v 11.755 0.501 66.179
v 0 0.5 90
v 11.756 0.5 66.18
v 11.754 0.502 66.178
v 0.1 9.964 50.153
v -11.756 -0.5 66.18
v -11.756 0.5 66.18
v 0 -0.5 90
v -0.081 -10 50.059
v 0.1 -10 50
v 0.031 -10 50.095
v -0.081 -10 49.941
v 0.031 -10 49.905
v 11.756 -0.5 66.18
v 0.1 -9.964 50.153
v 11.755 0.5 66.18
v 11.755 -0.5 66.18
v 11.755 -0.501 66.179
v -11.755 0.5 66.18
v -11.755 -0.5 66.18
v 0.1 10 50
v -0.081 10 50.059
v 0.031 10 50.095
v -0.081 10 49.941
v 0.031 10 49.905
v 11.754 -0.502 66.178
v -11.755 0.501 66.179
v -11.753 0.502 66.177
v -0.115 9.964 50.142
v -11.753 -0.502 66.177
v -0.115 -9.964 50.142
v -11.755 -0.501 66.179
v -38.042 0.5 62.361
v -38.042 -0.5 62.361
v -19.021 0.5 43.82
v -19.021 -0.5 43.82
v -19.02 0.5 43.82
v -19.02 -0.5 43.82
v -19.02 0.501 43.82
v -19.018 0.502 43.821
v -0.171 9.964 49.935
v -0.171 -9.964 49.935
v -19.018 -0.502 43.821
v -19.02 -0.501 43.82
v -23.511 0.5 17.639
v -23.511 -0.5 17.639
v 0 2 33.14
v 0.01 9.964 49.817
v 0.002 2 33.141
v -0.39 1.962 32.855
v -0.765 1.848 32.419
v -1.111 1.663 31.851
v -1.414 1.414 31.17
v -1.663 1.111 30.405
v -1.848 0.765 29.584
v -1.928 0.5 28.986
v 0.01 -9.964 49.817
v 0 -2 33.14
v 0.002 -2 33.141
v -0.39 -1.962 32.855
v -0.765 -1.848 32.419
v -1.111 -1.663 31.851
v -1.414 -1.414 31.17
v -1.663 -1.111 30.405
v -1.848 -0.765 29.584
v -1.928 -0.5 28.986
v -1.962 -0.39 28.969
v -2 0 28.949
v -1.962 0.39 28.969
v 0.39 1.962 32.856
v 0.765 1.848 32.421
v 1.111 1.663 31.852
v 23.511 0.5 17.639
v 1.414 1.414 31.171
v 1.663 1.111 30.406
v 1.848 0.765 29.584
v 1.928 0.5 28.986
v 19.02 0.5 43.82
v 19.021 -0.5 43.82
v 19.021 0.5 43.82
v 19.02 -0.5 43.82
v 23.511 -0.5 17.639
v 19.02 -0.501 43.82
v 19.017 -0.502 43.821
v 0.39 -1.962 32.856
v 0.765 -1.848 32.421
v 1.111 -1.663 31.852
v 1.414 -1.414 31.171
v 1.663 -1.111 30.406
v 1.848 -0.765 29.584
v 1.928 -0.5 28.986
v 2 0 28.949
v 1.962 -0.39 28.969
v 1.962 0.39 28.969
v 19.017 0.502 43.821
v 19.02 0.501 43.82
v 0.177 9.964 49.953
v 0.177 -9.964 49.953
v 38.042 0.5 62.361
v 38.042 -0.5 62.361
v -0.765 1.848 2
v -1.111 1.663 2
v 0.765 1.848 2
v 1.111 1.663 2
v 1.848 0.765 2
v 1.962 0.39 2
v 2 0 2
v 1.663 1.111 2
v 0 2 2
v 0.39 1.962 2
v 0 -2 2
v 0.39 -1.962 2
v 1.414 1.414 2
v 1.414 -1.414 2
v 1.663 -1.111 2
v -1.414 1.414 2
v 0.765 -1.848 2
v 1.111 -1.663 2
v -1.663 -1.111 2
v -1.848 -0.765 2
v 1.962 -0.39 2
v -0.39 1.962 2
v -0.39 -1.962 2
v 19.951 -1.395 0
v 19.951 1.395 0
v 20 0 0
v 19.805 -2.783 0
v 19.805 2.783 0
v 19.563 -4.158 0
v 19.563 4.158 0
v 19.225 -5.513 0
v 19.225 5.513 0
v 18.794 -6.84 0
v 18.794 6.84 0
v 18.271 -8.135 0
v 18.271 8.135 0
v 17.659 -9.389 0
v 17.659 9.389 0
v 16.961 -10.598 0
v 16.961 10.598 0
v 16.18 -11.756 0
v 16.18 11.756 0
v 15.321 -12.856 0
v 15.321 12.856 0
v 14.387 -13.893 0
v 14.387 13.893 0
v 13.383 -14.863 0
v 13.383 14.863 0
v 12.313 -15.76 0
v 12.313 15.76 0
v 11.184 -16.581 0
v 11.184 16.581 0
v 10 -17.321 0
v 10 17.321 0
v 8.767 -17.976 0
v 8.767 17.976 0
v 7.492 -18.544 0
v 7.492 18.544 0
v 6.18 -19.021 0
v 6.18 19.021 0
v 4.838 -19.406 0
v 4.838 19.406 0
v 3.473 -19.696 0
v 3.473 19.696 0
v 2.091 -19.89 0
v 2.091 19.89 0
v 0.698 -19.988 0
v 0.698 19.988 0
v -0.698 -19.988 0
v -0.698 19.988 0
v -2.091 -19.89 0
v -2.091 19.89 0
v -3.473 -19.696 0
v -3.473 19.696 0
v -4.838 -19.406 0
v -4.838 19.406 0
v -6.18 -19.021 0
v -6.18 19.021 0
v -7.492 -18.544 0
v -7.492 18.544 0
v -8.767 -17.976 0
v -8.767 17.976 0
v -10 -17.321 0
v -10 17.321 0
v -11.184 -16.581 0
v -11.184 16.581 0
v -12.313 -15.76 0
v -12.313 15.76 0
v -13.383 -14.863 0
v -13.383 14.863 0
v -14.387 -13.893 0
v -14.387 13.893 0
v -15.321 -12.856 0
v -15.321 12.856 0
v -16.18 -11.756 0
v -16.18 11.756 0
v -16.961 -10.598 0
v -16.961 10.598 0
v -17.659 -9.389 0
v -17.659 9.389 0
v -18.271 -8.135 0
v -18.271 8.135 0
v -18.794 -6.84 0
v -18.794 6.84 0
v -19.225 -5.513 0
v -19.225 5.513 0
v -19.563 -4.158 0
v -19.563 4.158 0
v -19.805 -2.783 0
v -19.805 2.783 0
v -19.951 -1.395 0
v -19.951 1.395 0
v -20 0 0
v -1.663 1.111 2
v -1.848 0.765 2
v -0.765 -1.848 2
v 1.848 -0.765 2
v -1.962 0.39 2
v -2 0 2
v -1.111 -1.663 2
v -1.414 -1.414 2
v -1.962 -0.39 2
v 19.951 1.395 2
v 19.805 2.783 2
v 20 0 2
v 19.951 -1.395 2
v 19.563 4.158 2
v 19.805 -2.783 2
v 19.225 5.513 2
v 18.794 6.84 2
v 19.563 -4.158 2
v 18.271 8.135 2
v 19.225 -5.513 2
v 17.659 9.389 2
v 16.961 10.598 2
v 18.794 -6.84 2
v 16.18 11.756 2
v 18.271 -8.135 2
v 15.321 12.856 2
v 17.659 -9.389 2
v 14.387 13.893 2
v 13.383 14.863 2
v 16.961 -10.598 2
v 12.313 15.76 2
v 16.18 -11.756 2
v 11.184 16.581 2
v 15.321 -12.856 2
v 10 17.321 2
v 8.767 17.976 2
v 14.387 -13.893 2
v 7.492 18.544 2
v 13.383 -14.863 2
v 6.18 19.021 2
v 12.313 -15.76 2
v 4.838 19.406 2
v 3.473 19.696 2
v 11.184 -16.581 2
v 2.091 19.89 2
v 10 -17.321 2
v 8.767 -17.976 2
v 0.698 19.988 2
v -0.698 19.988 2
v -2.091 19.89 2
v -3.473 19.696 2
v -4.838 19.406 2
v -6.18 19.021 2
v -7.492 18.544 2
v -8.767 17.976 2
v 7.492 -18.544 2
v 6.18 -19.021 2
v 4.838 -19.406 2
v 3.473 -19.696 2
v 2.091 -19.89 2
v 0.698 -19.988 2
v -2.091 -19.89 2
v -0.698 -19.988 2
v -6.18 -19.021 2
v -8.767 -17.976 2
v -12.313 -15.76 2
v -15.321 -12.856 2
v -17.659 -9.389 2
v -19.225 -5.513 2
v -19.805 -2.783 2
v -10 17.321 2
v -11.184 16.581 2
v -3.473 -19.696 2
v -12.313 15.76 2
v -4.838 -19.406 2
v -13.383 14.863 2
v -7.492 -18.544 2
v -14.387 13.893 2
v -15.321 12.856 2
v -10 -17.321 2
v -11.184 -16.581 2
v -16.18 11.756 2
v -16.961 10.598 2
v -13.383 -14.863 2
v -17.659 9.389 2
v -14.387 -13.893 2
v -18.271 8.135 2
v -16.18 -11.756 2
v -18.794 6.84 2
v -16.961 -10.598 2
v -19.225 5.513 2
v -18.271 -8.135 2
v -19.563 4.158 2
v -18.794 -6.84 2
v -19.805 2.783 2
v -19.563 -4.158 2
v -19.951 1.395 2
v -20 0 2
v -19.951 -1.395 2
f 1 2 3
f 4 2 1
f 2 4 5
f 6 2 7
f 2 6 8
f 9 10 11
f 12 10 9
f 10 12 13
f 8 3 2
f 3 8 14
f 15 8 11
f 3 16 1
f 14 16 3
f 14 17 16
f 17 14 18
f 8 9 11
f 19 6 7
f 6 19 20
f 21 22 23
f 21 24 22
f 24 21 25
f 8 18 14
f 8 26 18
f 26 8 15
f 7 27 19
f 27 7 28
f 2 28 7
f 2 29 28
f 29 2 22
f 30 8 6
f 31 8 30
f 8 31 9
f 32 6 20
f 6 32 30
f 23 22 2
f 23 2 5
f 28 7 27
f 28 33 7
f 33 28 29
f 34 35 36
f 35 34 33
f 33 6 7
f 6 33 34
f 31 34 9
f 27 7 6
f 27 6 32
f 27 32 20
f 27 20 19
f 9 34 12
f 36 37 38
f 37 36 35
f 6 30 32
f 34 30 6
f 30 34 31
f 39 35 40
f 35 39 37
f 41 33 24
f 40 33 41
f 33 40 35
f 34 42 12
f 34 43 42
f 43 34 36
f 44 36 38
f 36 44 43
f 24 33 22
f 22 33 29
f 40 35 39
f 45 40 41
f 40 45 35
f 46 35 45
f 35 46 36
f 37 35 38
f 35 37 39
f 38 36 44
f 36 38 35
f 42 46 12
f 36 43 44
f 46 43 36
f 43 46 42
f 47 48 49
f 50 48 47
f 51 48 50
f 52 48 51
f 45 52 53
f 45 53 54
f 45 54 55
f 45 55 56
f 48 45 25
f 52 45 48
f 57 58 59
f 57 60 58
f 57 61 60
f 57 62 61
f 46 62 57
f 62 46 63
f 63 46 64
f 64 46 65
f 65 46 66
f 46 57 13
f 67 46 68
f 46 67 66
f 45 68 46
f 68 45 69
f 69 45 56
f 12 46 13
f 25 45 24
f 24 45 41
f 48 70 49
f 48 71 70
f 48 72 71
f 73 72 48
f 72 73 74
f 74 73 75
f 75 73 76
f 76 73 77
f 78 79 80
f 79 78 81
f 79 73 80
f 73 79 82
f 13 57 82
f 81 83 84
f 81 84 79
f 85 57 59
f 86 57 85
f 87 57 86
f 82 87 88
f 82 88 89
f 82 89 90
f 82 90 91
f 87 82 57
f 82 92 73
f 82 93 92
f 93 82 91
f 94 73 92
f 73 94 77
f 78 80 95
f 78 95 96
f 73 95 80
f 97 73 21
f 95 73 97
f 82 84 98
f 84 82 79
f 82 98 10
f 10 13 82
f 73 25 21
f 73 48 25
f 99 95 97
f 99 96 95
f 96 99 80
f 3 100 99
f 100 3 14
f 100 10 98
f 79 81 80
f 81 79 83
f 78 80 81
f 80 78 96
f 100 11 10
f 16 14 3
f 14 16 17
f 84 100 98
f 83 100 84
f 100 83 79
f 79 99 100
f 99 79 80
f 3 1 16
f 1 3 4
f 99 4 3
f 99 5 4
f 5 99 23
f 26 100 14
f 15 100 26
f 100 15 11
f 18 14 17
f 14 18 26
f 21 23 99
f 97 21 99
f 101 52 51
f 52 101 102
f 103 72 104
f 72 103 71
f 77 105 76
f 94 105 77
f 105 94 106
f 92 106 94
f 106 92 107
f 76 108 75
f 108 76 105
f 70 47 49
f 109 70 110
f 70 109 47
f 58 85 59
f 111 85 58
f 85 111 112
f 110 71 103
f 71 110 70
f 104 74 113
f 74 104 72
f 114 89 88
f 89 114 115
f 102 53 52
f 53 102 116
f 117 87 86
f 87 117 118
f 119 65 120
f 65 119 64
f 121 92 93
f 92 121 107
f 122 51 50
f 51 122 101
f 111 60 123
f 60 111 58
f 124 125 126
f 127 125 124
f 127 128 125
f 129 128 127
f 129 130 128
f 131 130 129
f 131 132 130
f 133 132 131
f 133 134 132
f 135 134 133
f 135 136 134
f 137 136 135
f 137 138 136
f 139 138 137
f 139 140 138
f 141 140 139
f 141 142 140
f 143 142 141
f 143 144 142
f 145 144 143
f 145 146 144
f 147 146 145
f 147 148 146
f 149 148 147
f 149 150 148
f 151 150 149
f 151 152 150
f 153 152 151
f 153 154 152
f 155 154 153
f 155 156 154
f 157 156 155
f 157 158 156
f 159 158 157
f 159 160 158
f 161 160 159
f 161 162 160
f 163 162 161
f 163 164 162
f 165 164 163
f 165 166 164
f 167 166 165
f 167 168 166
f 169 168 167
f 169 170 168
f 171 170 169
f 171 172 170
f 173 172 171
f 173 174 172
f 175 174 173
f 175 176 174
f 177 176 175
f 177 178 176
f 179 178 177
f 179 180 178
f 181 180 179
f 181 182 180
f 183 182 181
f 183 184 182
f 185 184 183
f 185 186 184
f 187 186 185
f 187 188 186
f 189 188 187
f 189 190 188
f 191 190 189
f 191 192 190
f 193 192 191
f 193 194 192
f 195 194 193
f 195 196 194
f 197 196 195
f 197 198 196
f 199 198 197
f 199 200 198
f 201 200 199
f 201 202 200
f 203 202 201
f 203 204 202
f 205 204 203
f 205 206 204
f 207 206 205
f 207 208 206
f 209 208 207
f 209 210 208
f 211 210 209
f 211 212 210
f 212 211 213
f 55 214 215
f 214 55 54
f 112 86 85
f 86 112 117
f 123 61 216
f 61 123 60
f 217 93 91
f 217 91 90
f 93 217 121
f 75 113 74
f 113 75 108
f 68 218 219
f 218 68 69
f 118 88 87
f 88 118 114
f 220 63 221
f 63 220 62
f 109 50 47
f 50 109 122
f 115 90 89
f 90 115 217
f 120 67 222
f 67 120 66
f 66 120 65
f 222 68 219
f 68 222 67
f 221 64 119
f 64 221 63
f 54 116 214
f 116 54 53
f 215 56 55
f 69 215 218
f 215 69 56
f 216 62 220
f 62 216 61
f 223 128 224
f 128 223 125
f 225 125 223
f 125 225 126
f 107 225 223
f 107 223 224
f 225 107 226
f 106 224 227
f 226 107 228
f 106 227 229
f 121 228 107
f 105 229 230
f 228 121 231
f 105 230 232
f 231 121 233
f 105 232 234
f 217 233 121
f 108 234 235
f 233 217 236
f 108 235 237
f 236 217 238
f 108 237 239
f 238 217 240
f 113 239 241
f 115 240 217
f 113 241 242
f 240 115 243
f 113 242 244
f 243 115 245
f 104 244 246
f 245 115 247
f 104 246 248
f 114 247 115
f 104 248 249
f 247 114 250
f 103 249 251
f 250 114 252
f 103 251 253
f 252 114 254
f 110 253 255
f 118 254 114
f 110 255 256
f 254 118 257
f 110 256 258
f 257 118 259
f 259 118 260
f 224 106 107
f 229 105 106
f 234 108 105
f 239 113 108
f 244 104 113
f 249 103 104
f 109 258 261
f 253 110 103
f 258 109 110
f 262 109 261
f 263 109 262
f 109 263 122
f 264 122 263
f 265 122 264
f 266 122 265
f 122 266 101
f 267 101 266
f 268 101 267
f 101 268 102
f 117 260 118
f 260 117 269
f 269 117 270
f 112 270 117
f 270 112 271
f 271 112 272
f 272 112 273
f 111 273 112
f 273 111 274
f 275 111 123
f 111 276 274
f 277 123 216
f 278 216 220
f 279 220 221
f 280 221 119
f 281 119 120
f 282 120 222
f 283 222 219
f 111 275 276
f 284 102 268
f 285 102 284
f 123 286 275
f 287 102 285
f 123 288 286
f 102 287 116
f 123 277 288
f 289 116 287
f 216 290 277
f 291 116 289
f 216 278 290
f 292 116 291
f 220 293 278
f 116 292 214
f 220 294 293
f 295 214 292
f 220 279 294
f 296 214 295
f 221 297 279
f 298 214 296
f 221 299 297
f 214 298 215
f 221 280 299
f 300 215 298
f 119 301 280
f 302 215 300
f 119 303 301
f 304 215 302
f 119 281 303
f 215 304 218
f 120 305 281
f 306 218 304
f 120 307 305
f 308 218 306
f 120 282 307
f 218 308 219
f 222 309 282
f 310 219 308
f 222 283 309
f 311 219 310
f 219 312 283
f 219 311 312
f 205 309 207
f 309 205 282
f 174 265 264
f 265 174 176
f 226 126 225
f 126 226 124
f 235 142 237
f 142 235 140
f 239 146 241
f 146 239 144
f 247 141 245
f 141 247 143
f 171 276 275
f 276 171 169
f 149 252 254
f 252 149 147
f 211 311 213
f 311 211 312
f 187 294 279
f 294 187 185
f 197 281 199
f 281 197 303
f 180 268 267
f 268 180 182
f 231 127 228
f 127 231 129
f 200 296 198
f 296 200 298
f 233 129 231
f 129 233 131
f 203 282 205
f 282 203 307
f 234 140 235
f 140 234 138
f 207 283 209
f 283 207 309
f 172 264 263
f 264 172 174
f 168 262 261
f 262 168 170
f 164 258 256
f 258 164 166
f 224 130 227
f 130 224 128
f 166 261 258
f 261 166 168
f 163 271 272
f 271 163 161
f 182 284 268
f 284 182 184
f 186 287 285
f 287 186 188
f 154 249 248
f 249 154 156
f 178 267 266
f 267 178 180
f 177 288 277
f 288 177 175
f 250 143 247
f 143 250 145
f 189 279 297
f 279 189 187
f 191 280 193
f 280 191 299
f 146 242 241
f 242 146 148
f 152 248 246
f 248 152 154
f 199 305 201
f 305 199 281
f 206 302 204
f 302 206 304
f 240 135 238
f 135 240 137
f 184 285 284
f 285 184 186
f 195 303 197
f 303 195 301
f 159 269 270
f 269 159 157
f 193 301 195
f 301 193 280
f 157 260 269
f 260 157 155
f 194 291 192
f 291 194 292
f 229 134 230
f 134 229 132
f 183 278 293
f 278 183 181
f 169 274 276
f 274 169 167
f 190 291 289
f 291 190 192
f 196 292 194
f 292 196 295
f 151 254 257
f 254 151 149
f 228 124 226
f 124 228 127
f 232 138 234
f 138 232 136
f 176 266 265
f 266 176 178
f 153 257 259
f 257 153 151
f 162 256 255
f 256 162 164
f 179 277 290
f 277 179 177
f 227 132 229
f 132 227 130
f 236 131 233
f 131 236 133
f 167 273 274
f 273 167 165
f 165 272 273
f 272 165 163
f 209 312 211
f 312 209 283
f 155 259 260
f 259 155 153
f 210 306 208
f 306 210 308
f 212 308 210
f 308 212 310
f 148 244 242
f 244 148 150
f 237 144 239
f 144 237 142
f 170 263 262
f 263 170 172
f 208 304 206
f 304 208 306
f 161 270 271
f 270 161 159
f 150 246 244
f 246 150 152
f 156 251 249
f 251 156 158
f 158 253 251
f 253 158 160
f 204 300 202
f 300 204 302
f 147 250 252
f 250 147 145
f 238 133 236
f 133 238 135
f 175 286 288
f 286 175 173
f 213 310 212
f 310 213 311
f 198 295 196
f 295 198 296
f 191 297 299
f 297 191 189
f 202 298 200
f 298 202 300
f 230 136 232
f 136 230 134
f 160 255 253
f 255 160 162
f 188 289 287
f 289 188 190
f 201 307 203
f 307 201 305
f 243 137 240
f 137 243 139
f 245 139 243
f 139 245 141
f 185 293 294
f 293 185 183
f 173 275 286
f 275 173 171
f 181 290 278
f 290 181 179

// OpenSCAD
$fa = 4; $fs = 0.4;

module star() {
     color("gold") translate([0, 0, 50]) rotate([90, 0, 0]) for (a = [0:5]) {
        rotate(72 * a) hull() {
            linear_extrude(1, center = true) {
                polygon([[0, 0], for (i = [-1:1])
                    let(angle = 36 * i, dia = 40 - 20 * (abs(i) % 2))
                        dia * [-sin(angle), cos(angle)] ]);
            }
            cylinder(r = 0.1, h = 20, center = true);
        }
    }
    color("silver") {
        cylinder(r = 2, h = 50);
        cylinder(r = 20, h = 2);
    }
}

star();

// Written in 2019 by Torsten Paul <Torsten.Paul@gmx.de>
//
// To the extent possible under law, the author(s) have dedicated all
// copyright and related and neighboring rights to this software to the
// public domain worldwide. This software is distributed without any
// warranty.
//
// You should have received a copy of the CC0 Public Domain
// Dedication along with this software.
// If not, see <http://creativecommons.org/publicdomain/zero/1.0/>.
